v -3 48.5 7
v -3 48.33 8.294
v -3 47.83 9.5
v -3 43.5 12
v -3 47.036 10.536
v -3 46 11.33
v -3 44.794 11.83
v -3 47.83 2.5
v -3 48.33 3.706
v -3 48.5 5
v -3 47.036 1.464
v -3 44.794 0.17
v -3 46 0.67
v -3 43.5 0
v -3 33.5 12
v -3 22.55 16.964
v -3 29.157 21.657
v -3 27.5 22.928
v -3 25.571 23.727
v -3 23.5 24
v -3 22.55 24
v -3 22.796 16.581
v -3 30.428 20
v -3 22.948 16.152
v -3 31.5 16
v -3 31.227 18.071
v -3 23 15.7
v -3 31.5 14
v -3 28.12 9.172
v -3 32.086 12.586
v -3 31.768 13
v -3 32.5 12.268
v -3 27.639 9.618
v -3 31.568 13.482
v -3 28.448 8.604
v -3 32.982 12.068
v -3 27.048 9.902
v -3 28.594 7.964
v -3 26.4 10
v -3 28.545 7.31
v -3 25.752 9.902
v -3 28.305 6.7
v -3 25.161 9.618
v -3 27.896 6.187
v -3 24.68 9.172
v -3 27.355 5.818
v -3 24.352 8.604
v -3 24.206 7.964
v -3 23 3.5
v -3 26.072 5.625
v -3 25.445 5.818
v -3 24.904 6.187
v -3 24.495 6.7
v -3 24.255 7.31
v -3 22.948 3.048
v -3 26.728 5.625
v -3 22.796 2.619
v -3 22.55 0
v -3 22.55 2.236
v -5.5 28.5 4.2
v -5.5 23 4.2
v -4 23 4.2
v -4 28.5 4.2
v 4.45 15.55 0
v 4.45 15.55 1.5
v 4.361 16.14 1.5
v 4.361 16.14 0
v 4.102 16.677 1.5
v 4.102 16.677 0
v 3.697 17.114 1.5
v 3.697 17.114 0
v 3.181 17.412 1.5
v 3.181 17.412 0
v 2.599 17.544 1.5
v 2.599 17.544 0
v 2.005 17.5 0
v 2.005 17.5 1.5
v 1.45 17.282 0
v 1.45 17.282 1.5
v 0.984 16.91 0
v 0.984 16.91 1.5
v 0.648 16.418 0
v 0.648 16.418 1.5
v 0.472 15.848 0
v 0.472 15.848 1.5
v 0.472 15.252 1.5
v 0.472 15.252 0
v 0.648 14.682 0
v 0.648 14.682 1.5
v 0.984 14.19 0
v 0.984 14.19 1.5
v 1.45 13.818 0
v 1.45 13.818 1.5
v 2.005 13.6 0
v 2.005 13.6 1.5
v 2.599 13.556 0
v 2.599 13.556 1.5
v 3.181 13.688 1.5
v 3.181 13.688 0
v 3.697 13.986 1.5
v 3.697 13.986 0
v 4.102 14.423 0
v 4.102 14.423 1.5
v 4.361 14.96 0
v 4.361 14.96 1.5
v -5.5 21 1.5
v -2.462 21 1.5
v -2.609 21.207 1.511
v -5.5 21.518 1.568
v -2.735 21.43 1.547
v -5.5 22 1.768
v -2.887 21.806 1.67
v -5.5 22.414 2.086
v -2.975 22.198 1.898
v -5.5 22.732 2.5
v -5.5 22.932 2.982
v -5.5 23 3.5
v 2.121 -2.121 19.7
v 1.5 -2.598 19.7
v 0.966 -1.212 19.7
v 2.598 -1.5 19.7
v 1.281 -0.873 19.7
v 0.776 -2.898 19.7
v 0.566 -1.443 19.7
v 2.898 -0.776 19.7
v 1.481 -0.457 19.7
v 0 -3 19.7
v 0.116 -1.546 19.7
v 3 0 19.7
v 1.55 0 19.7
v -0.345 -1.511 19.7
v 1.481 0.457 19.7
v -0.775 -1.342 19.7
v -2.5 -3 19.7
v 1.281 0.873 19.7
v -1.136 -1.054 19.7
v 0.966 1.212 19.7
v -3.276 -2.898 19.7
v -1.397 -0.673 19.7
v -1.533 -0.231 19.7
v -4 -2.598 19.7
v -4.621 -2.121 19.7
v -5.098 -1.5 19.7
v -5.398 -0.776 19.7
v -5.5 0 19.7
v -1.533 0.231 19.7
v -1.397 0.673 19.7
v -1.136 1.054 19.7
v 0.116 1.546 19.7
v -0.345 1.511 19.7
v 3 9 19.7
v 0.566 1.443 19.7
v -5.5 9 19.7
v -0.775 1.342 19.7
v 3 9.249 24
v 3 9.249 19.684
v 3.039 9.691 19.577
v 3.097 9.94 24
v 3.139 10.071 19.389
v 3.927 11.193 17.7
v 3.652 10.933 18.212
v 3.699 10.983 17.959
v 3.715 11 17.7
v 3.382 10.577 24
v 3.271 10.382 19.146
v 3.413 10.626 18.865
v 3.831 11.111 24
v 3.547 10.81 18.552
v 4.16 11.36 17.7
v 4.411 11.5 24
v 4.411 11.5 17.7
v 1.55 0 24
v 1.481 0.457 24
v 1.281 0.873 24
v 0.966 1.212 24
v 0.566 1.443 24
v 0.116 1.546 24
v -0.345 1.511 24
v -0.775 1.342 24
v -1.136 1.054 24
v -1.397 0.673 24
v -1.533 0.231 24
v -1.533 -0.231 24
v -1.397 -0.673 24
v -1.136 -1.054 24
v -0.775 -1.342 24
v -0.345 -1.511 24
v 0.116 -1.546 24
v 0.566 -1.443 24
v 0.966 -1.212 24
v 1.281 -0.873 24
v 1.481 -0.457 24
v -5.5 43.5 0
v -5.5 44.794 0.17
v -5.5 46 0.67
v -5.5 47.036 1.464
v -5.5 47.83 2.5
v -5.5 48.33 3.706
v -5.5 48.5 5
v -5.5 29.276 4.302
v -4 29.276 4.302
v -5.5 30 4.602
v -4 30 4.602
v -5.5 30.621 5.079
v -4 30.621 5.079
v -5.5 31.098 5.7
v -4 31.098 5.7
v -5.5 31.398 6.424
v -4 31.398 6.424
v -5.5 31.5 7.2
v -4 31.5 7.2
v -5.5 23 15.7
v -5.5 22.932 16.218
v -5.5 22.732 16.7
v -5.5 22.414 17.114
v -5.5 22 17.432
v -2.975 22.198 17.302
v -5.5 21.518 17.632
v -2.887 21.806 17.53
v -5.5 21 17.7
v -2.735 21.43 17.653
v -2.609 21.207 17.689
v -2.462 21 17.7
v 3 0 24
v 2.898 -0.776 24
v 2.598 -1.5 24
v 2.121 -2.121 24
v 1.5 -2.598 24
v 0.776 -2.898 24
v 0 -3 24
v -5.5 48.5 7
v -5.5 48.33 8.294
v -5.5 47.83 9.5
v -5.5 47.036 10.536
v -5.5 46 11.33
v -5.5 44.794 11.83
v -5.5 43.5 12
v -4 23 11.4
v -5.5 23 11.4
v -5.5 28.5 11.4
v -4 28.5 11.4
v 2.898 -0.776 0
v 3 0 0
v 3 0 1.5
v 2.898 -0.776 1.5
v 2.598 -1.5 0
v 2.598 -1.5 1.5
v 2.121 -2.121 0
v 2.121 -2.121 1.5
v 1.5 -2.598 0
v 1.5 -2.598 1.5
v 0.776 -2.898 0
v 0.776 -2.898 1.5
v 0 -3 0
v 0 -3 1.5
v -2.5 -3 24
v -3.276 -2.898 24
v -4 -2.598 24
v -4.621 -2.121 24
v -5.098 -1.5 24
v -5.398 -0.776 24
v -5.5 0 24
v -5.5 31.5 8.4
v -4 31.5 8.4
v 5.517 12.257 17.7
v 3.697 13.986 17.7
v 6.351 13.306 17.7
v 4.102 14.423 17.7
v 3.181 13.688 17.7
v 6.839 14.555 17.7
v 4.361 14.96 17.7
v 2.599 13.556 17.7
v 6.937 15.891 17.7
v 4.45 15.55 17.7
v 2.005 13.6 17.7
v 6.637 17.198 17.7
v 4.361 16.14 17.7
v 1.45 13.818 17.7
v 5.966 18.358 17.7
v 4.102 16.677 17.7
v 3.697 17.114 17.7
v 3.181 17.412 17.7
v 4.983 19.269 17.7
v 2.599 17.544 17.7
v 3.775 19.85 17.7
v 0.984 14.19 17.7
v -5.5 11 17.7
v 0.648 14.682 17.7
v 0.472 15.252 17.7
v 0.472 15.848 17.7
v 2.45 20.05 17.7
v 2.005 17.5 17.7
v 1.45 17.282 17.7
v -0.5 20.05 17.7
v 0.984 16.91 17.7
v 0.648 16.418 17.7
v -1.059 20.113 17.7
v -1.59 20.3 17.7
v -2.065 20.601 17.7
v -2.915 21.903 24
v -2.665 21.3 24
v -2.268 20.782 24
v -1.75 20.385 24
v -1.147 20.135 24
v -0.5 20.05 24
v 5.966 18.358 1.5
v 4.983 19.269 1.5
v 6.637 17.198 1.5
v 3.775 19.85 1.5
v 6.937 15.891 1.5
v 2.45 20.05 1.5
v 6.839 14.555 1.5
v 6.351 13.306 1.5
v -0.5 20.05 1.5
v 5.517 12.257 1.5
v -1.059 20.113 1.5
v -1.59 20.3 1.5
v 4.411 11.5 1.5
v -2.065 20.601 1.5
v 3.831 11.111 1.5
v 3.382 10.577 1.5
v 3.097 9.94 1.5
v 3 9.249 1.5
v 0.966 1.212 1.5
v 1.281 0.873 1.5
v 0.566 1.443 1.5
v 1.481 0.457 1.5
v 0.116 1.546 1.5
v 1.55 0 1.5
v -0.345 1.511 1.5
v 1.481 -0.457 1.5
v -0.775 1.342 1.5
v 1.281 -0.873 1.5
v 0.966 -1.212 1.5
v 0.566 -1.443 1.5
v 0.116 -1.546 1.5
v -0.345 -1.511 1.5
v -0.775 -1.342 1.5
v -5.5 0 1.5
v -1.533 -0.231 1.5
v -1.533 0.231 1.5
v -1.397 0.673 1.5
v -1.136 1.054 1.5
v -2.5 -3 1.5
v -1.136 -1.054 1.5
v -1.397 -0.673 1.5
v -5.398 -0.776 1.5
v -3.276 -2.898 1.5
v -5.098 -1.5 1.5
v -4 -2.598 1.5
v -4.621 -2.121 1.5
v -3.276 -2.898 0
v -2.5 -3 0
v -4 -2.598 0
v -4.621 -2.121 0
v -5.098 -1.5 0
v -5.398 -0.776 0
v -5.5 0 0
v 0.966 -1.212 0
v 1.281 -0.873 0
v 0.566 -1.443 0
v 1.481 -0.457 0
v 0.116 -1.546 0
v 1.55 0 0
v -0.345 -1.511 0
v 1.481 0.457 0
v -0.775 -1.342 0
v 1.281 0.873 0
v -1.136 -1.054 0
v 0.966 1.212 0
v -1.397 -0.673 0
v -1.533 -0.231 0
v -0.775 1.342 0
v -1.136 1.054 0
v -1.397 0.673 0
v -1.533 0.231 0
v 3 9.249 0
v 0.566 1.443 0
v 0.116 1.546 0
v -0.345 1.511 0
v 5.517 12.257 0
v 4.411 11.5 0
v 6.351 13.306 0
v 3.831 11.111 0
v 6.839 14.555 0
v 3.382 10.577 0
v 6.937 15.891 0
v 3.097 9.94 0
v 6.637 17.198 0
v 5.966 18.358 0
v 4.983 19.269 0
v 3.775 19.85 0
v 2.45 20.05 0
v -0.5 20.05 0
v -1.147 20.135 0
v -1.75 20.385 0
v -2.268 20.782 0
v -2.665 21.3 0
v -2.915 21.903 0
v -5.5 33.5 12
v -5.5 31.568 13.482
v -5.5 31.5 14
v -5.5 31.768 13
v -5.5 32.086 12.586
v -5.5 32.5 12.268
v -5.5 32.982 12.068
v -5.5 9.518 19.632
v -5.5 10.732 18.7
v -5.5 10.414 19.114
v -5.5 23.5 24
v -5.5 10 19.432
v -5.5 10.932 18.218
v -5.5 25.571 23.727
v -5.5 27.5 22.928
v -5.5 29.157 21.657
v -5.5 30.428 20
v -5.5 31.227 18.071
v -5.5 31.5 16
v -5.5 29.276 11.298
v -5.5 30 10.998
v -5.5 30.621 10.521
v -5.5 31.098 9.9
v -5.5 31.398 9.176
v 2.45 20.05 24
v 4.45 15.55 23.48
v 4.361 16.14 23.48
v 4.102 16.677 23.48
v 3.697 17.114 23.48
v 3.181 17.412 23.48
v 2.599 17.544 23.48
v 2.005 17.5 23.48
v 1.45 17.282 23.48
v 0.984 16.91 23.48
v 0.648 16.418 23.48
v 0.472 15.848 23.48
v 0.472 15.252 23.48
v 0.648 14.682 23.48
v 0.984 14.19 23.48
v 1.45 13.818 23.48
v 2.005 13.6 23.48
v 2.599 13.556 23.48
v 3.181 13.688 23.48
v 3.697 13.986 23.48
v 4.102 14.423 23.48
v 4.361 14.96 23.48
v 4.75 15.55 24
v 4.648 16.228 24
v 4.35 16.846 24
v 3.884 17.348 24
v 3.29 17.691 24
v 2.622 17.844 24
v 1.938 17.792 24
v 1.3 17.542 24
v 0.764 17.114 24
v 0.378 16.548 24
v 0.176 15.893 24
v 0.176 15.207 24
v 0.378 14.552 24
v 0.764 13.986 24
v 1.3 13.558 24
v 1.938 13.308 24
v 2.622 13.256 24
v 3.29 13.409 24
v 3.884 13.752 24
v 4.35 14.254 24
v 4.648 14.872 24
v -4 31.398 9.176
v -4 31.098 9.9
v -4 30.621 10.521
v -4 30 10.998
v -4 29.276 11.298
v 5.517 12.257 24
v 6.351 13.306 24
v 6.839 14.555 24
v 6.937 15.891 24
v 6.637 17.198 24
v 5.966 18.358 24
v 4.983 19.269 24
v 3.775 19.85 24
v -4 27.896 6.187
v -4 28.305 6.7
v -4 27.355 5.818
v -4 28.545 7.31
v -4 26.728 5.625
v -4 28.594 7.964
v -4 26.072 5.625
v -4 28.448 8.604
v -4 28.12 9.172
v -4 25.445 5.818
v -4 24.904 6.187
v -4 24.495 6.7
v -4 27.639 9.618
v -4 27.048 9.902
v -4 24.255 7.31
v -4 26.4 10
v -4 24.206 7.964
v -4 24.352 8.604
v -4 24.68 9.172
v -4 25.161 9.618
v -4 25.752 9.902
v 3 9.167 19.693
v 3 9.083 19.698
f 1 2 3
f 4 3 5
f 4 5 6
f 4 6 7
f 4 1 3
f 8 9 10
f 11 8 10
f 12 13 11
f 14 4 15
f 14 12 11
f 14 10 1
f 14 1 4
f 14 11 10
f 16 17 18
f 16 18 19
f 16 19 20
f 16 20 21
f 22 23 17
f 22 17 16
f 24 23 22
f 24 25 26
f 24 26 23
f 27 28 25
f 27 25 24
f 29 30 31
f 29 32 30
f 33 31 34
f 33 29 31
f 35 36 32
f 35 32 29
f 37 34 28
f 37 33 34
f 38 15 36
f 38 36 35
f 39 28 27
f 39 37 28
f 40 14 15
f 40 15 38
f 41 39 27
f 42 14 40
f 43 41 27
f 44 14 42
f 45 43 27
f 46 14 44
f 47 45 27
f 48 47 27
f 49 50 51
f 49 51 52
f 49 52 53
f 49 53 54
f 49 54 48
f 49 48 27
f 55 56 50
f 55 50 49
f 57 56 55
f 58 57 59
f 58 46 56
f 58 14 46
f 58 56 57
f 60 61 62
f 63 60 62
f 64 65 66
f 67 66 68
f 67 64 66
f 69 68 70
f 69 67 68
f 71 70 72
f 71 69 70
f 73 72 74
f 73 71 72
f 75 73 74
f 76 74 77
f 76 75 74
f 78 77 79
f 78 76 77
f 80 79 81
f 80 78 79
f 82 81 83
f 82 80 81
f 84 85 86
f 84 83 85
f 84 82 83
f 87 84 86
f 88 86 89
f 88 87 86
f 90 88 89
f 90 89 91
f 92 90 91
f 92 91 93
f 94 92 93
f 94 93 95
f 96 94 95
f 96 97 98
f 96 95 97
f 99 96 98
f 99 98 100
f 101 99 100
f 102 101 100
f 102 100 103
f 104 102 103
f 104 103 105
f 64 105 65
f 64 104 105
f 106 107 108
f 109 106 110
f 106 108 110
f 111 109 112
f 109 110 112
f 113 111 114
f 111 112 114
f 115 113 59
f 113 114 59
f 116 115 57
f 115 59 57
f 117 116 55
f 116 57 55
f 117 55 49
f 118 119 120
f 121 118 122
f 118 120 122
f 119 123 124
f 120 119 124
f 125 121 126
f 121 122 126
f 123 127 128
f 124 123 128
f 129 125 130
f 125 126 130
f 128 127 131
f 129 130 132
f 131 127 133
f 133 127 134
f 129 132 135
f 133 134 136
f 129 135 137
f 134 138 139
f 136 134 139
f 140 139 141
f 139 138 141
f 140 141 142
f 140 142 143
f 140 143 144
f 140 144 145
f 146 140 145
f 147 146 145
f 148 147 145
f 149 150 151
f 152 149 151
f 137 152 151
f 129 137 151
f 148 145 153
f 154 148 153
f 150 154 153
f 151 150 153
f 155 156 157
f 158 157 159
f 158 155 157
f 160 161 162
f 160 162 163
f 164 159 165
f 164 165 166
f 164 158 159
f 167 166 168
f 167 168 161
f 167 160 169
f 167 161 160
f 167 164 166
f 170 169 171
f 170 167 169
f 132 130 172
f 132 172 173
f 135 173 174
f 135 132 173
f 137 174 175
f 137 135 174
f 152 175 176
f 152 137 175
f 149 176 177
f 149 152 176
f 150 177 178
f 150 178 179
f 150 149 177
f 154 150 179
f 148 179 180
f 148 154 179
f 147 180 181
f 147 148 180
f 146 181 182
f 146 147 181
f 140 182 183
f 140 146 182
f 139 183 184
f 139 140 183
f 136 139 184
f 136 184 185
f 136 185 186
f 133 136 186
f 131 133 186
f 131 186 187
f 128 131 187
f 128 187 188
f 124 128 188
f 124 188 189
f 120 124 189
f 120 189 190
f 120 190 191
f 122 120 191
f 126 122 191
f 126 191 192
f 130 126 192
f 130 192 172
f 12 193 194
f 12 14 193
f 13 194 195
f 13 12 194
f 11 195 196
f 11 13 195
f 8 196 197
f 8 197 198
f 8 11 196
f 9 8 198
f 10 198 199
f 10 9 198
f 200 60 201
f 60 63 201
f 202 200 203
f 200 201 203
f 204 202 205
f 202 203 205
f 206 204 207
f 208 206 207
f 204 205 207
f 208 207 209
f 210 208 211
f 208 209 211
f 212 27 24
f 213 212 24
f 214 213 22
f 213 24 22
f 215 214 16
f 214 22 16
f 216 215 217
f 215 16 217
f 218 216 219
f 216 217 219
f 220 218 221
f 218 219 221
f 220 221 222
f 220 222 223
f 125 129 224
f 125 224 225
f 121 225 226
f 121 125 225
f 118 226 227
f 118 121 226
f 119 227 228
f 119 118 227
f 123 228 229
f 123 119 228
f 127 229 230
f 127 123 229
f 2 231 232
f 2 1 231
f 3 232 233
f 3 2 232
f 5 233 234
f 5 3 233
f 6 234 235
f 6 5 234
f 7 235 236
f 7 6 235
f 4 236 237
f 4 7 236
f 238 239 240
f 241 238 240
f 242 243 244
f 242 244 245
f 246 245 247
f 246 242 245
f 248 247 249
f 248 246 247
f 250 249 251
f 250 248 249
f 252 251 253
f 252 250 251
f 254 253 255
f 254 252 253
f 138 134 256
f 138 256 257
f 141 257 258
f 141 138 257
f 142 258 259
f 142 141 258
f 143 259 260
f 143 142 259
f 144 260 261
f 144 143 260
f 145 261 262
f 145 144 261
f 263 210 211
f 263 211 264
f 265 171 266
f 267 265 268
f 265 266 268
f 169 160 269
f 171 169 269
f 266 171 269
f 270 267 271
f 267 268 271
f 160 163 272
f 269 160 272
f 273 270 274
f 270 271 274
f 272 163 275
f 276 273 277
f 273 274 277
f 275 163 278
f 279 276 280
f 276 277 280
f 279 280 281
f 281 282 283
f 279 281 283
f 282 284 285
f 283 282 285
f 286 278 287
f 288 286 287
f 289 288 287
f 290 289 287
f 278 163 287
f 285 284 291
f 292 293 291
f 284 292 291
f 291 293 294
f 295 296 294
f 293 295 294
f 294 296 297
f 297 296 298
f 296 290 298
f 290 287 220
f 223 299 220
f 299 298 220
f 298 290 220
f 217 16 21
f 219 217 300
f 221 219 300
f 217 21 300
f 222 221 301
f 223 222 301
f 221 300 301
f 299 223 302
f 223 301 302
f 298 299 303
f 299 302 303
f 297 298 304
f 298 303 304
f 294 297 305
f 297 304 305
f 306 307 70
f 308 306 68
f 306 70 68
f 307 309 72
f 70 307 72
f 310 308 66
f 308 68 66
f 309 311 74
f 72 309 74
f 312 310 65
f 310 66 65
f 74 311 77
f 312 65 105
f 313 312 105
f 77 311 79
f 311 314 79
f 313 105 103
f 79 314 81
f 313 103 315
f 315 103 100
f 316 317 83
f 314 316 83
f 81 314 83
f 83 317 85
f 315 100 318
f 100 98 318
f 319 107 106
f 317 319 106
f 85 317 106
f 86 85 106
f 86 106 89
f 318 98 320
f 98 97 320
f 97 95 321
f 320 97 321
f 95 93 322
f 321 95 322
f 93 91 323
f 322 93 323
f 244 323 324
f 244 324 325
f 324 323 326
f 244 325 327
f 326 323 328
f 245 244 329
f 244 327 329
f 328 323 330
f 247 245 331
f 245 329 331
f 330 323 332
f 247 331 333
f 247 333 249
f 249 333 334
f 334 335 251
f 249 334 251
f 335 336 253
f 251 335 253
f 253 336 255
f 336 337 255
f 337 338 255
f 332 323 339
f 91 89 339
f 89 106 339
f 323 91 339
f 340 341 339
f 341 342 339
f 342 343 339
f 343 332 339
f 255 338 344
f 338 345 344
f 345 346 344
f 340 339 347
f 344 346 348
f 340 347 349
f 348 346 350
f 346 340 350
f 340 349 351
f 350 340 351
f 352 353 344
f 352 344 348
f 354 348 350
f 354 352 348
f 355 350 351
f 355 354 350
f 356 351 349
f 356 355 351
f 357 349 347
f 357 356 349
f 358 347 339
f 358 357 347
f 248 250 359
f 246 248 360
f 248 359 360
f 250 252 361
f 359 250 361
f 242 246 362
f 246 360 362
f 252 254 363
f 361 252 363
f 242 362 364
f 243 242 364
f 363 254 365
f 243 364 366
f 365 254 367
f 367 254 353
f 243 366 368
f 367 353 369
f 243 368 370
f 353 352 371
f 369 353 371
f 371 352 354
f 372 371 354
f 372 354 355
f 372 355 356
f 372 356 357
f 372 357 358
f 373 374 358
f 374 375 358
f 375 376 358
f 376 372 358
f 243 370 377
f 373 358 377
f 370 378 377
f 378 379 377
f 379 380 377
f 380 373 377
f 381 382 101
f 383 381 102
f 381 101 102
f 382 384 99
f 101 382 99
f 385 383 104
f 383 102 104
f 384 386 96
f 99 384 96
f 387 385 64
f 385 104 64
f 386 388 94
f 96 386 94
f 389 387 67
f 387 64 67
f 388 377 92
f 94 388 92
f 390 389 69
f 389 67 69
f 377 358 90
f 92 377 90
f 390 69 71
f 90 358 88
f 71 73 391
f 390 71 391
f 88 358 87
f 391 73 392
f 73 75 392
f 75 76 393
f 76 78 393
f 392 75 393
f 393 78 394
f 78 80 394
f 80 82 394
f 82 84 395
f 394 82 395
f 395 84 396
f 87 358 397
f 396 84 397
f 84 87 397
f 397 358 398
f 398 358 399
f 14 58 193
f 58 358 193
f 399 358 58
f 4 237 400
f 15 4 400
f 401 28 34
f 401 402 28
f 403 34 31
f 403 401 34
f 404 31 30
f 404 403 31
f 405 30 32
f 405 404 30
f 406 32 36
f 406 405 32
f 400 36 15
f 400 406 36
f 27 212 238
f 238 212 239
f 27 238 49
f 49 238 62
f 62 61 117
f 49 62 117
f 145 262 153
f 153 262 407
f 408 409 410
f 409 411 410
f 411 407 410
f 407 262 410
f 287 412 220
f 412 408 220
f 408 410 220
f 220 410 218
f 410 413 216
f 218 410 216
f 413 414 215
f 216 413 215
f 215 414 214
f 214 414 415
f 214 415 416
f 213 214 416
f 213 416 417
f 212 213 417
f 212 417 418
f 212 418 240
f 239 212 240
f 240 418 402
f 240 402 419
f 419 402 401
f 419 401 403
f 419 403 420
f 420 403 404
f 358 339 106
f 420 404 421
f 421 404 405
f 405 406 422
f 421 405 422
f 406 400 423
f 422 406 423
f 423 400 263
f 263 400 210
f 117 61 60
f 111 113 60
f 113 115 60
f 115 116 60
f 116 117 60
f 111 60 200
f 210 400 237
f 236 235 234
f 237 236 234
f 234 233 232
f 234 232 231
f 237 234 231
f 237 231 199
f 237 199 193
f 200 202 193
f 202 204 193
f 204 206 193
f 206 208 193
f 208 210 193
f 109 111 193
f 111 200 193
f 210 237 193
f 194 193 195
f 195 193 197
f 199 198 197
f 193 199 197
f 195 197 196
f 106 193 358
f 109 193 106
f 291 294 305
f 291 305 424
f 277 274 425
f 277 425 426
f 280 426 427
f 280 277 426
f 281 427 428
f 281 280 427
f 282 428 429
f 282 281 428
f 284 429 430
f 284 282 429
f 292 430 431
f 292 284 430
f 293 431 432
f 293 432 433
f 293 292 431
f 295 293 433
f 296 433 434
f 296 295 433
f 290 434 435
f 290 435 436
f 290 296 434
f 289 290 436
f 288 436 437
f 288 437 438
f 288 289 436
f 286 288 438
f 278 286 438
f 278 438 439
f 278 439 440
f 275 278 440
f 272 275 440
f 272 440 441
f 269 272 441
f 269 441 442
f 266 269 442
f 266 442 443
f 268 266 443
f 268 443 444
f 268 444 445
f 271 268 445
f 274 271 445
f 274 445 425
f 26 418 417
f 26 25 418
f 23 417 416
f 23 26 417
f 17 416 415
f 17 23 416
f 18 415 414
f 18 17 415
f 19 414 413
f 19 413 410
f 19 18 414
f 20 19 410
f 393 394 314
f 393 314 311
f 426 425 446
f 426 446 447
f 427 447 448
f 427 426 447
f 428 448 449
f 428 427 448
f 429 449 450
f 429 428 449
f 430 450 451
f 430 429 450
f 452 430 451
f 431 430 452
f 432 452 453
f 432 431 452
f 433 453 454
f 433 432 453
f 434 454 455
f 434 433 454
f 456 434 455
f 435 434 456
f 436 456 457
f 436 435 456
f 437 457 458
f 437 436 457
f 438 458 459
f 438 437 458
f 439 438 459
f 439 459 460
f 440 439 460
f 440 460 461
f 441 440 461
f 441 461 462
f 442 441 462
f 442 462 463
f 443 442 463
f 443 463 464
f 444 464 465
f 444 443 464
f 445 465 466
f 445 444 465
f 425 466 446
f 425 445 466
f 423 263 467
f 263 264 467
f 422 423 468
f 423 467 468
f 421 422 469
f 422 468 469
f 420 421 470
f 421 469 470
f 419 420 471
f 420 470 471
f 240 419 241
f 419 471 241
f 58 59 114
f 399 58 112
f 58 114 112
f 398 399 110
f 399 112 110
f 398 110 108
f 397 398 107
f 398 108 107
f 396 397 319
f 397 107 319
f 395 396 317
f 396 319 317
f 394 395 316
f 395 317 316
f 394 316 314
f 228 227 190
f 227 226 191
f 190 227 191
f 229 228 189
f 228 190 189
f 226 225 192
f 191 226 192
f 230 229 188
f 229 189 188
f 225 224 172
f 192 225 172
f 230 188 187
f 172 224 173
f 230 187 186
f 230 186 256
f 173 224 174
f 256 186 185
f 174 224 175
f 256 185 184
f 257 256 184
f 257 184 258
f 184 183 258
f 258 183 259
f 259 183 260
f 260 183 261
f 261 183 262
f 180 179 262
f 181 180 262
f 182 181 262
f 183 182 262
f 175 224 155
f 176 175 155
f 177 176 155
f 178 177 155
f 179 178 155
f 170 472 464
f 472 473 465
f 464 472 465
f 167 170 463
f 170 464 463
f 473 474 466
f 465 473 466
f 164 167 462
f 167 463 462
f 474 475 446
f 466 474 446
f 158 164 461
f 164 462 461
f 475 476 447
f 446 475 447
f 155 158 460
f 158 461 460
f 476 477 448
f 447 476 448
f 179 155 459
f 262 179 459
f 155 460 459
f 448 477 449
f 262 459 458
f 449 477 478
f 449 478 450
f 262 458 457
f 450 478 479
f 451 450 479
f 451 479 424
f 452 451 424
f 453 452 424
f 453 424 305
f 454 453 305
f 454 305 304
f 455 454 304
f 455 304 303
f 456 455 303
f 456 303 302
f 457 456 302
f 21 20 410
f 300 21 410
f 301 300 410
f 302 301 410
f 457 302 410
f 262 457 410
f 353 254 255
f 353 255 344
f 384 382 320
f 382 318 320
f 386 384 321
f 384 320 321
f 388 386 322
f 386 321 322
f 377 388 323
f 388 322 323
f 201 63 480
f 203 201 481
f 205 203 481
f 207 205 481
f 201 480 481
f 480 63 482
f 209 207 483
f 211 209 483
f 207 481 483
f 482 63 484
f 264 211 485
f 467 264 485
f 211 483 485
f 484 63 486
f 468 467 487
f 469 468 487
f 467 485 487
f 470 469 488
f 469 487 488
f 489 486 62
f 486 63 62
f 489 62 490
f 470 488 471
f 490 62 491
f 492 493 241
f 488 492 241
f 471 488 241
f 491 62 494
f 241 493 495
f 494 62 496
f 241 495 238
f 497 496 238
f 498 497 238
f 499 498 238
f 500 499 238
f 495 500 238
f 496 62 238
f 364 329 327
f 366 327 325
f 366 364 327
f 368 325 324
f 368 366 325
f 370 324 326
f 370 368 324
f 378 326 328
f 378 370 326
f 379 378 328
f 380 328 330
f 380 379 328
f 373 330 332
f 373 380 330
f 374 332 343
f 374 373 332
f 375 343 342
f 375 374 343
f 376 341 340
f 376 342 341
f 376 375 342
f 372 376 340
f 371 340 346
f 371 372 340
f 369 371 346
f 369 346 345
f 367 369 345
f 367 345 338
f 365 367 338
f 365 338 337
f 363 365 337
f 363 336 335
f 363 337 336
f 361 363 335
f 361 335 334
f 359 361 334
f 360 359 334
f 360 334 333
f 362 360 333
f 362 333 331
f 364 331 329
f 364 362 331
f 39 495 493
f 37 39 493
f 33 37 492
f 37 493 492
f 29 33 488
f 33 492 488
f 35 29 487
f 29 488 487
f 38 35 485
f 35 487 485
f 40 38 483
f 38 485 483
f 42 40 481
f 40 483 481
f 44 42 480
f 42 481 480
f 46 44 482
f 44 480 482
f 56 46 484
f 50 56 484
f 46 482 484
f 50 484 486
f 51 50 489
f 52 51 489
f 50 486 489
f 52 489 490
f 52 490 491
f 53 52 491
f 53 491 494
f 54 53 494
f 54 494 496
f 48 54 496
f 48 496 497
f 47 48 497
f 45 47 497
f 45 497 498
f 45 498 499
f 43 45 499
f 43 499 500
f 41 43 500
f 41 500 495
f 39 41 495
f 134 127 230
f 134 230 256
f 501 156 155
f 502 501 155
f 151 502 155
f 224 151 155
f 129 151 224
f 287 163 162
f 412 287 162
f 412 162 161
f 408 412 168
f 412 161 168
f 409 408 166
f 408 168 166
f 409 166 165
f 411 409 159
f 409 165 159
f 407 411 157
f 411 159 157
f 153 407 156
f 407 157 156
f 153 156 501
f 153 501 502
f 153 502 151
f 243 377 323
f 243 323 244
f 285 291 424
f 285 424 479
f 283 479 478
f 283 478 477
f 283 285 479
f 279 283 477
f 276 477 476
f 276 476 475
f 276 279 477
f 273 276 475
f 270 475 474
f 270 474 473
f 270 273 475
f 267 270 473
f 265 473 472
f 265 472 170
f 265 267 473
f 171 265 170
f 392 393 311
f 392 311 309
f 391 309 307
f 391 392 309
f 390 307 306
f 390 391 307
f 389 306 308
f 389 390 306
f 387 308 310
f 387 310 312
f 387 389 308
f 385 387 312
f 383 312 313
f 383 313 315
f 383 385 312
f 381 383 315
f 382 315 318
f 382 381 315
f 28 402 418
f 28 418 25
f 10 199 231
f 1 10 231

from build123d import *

# Parameters (mm, degrees)
CROQUIS1_R              = 2
CROQUIS1_R_2            = 1.55
SALIENTE_EXTRUIR1_DEPTH = 24
CORTAR_EXTRUIR1_DEPTH   = 20
REDONDEO1_R             = 8
REDONDEO2_R             = 2
REDONDEO5_R             = 2.5
CROQUIS3_R              = 2.2
CORTAR_EXTRUIR2_DEPTH   = 20
CROQUIS4_W              = 1.5
CROQUIS4_H              = 7.2
CORTAR_EXTRUIR3_DEPTH   = 20
SALIENTE_EXTRUIR2_REACH = 43.512
REDONDEO7_R             = 2
CROQUIS6_W              = 7.2
CROQUIS6_H              = 3
CORTAR_EXTRUIR4_DEPTH   = 1.5
REDONDEO8_R             = 3
REDONDEO9_R             = 5
CHAFL_N1_SIZE           = 0.3
CHAFL_N1_SIZE2          = 0.519615242


with BuildPart() as part:
    # Croquis1 → Saliente-Extruir1 (new body)
    with BuildSketch(Plane.XY):
        with BuildLine():
            Line((-5.5, 0), (-5.5, 31.5))
            Line((-5.5, 31.5), (-3, 31.5))
            Line((-3, 31.5), (-3, 20.05))
            Line((-3, 20.05), (2.45, 20.05))
            ThreePointArc((2.45, 20.05), (6.941557686, 15.825516889), (3, 11.08373758))
            Line((3, 11.08373758), (3, 0))
            ThreePointArc((3, 0), (2.121320344, -2.121320344), (0, -3))
            Line((0, -3), (-2.5, -3))
            ThreePointArc((-2.5, -3), (-4.621320344, -2.121320344), (-5.5, 0))
        make_face()
        with Locations((2.45, 15.55)):
            Circle(CROQUIS1_R, mode=Mode.SUBTRACT)
        Circle(CROQUIS1_R_2, mode=Mode.SUBTRACT)
    extrude(amount=SALIENTE_EXTRUIR1_DEPTH)

    # Croquis2 → Cortar-Extruir1 (cut)
    with BuildSketch(Plane.ZY.offset(5.5)):
        Polygon((1.5, -3), (19.7, -3), (19.7, 11), (17.7, 11), (17.7, 23), (1.5, 23), align=None)
    extrude(amount=-CORTAR_EXTRUIR1_DEPTH, mode=Mode.SUBTRACT)

    # Redondeo1
    redondeo1_edges = [part.edges().sort_by_distance(p)[0] for p in [
        (-4.25, 31.5, 0),
        (-4.25, 31.5, 24),
    ]]
    fillet(redondeo1_edges, radius=REDONDEO1_R)

    # Redondeo2
    redondeo2_edges = [part.edges().sort_by_distance(p)[0] for p in [
        (-1.25, 11, 19.7),
        (-4.25, 23, 17.7),
        (-4.25, 23, 1.5),
    ]]
    fillet(redondeo2_edges, radius=REDONDEO2_R - 0.0001)  # a hair under: the kernel refuses the full size

    # Redondeo5
    redondeo5_edges = [part.edges().sort_by_distance(p)[0] for p in [
        (3, 11.08373758, 0.75),
        (-3, 20.05, 20.85),
        (3, 11.08373758, 20.85),
        (-3, 20.05, 0.75),
    ]]
    fillet(redondeo5_edges, radius=REDONDEO5_R)

    # Croquis3 → Cortar-Extruir2 (cut)
    with BuildSketch(Plane.ZY.offset(5.5)):
        with Locations((7.8, 26.4)):
            Circle(CROQUIS3_R)
    extrude(amount=-CORTAR_EXTRUIR2_DEPTH, mode=Mode.SUBTRACT)

    # Croquis4 → Cortar-Extruir3 (cut)
    with BuildSketch(Plane.XZ.offset(-23)):
        with Locations((-4.75, 7.8)):
            Rectangle(CROQUIS4_W, CROQUIS4_H)
    extrude(amount=-CORTAR_EXTRUIR3_DEPTH, mode=Mode.SUBTRACT)

    # Saliente-Extruir2: up to this face of the body (flat: up to its plane)
    saliente_extruir2_end = Plane(part.part.faces().sort_by_distance((-3, 26.79790631, 12.475730365))[0])
    # Croquis5 → Saliente-Extruir2 (add, up to the picked face)
    with BuildSketch(Plane.ZY.offset(5.5), mode=Mode.PRIVATE) as saliente_extruir2_sk1:
        Polygon((0, 23.5), (0, 48.5), (12, 48.5), (12, 30), (4.2, 30), align=None)
    saliente_extruir2_tool1 = split(extrude(saliente_extruir2_sk1.sketch, amount=-SALIENTE_EXTRUIR2_REACH, mode=Mode.PRIVATE), bisect_by=saliente_extruir2_end, keep=Keep.BOTH, mode=Mode.PRIVATE)
    add(saliente_extruir2_tool1.solids().sort_by(Axis((-5.5, 38.588691, 5.733546), (1, 0, 0)))[0])

    # Redondeo7
    redondeo7_edges = [part.edges().sort_by_distance(p)[0] for p in [
        (-4.25, 31.5, 12),
    ]]
    fillet(redondeo7_edges, radius=REDONDEO7_R)

    # Croquis6 → Cortar-Extruir4 (cut)
    with BuildSketch(Plane.ZY.offset(5.5)):
        with Locations((7.8, 30)):
            Rectangle(CROQUIS6_W, CROQUIS6_H)
    extrude(amount=-CORTAR_EXTRUIR4_DEPTH, mode=Mode.SUBTRACT)

    # Redondeo8
    redondeo8_edges = [part.edges().sort_by_distance(p)[0] for p in [
        (-4.75, 31.5, 4.2),
        (-4.75, 31.5, 11.4),
    ]]
    fillet(redondeo8_edges, radius=REDONDEO8_R)

    # Redondeo9
    redondeo9_edges = [part.edges().sort_by_distance(p)[0] for p in [
        (-4.25, 48.5, 12),
        (-4.25, 48.5, 0),
    ]]
    fillet(redondeo9_edges, radius=REDONDEO9_R)

    # Chaflán1
    chafl_n1_edges = [part.edges().sort_by_distance(p)[0] for p in [
        (0.45, 15.55, 24),
    ]]
    chafl_n1_side = [part.faces().sort_by_distance(p)[0] for p in [
        (-0.877926413, 10.141568141, 24),
    ]]
    chamfer(chafl_n1_edges, length=CHAFL_N1_SIZE, length2=CHAFL_N1_SIZE2, reference=chafl_n1_side[0])


solid = part.part
